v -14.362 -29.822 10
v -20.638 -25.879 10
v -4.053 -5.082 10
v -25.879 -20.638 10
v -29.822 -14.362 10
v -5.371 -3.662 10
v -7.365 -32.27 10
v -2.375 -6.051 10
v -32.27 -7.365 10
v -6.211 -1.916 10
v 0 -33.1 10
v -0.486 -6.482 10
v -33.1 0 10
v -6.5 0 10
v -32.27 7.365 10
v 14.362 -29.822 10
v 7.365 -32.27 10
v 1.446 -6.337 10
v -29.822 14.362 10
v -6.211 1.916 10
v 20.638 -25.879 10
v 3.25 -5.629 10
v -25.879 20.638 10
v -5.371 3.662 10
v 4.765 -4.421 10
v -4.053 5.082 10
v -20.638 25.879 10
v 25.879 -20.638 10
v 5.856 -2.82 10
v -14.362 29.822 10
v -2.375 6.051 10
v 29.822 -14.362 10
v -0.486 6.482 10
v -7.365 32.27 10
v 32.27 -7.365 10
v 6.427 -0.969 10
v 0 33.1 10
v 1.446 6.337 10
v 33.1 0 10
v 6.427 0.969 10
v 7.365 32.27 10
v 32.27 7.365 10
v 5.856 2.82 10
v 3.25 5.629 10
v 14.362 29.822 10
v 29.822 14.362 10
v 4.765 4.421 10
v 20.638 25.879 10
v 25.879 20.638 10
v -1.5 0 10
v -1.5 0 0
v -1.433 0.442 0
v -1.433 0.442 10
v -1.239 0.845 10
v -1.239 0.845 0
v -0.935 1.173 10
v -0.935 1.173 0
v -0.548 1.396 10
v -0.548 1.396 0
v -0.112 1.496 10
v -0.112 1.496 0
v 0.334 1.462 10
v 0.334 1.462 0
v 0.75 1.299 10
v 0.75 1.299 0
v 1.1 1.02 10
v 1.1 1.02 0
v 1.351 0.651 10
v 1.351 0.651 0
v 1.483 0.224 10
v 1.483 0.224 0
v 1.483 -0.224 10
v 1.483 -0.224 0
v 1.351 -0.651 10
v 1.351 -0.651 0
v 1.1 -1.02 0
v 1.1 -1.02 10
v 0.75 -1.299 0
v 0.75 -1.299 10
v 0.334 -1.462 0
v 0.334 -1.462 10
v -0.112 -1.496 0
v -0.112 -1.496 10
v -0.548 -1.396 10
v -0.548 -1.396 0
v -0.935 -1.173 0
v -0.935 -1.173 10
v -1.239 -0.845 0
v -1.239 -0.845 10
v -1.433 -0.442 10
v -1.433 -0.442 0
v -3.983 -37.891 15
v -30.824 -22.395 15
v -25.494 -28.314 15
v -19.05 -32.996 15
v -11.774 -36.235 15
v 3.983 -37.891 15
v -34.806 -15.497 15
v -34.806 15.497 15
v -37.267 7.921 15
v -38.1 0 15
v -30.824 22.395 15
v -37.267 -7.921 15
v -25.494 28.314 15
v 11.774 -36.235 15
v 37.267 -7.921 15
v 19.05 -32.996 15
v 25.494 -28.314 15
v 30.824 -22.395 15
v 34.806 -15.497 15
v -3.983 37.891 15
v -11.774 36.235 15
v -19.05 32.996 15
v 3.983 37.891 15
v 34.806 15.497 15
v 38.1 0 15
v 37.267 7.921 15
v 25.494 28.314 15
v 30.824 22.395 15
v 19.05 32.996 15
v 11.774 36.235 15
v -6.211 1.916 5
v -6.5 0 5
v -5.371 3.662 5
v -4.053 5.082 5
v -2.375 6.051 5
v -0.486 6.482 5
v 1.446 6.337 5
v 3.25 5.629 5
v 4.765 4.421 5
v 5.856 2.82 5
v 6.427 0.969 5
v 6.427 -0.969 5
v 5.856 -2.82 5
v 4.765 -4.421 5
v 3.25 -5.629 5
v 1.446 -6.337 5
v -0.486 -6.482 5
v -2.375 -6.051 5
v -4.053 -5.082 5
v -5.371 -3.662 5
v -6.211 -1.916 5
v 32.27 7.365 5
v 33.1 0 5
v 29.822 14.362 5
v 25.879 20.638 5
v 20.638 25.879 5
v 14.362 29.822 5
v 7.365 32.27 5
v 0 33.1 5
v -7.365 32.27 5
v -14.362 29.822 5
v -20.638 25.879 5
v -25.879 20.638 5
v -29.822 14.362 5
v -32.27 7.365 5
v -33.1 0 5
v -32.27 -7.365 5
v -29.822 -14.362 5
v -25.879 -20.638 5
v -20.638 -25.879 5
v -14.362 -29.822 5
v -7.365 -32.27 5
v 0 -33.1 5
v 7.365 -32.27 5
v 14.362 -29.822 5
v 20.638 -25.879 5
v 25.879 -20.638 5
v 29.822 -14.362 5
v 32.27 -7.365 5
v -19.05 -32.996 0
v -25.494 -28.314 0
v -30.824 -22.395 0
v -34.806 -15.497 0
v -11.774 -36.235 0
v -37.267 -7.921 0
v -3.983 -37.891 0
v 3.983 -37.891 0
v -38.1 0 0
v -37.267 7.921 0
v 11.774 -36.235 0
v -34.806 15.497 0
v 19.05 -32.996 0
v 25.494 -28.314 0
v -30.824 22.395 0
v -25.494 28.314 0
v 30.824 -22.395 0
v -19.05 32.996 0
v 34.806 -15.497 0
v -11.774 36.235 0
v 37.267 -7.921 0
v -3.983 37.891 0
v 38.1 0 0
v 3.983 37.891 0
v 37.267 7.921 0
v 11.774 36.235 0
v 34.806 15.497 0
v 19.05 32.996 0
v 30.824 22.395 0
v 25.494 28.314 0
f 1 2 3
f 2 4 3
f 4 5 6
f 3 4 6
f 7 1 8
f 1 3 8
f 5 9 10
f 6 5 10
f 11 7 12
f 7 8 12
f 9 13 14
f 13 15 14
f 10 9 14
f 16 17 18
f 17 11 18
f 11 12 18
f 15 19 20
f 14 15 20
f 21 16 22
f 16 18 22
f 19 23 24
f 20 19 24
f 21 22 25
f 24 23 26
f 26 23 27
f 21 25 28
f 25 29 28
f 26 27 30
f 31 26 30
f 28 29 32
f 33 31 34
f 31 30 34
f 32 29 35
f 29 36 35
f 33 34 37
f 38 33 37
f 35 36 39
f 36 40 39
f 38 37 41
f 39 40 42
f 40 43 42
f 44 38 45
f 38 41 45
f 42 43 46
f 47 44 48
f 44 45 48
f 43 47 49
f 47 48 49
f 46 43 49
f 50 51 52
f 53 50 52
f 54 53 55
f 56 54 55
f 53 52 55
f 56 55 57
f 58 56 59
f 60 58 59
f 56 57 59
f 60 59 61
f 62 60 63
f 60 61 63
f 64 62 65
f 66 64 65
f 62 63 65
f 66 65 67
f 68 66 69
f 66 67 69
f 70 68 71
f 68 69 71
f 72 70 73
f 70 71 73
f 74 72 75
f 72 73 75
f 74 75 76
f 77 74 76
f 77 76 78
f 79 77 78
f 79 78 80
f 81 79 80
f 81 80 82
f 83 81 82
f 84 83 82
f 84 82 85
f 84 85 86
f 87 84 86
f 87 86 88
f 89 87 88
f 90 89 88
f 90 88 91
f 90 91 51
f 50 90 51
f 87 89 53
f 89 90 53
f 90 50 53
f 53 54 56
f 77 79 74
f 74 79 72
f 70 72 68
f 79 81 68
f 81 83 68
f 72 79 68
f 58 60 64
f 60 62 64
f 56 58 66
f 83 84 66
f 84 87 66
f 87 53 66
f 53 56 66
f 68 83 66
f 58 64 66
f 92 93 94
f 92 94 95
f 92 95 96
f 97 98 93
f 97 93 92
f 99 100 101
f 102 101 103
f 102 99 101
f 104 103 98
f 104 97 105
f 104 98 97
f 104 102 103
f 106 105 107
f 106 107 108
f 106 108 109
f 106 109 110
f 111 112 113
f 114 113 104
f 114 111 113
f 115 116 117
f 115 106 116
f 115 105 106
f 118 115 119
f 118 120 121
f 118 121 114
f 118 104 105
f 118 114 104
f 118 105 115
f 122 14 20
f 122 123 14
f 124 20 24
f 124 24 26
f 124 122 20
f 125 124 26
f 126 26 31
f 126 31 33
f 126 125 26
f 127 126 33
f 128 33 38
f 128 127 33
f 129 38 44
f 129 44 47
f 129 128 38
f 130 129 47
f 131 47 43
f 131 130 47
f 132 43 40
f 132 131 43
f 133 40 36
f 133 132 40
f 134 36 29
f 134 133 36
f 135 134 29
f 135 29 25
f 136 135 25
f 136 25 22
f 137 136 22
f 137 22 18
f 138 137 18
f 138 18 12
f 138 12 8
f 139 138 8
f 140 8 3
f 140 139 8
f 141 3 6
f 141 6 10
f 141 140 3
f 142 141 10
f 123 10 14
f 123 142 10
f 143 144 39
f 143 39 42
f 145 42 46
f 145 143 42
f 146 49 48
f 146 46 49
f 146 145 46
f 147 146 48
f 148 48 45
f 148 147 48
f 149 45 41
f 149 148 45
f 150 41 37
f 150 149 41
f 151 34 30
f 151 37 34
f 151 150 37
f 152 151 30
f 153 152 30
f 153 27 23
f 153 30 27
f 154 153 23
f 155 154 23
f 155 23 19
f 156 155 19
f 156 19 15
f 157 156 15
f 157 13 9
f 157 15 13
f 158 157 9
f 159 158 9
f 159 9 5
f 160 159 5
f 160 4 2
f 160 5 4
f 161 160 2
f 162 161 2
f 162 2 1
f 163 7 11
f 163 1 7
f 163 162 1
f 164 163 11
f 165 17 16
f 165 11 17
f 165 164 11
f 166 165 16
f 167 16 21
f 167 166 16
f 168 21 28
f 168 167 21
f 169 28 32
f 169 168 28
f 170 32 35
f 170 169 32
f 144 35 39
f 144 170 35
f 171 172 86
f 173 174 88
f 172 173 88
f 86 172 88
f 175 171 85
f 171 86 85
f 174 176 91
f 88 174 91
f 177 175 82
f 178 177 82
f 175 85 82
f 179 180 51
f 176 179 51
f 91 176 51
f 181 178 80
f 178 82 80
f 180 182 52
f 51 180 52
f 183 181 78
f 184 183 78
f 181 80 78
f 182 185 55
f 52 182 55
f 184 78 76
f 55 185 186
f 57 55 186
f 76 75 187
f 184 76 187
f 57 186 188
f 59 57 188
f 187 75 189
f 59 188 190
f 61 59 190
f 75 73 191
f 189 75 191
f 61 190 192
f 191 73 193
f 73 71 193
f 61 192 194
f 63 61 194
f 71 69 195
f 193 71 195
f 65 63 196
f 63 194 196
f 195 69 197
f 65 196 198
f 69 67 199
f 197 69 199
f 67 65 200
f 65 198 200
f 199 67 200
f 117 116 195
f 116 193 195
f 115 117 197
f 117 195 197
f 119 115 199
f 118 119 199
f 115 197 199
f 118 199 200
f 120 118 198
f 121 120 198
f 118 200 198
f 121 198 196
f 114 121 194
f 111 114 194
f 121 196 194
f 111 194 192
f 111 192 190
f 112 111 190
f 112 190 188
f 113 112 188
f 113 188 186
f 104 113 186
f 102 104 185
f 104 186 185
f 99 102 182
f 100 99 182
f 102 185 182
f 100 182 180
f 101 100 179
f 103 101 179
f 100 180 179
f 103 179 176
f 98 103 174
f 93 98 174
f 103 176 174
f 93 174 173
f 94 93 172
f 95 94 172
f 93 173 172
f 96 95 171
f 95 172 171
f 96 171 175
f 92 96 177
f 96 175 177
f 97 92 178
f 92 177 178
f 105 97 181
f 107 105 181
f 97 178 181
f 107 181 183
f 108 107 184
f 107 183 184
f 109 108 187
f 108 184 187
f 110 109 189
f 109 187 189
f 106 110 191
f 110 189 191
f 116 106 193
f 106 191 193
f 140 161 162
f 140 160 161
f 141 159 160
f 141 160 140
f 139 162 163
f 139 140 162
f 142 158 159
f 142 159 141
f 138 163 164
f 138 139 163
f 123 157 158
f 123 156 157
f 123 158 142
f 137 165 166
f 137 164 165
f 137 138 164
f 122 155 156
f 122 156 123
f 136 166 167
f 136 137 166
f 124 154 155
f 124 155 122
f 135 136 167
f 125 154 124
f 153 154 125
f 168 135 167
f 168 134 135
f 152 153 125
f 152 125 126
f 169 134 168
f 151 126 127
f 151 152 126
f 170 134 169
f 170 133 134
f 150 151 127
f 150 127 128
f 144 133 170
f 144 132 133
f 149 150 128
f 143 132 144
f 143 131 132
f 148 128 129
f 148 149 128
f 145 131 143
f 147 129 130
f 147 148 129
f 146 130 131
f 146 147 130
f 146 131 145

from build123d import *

# Parameters (mm, degrees)
SKETCH1_R                       = 38.1
BOSS_EXTRUDE1_DEPTH             = 15
F_3_0MM_CLEARANCE_DOWEL_HOLE1_D = 3
SHELL3_T                        = -5
BOSS_EXTRUDE2_START             = 10
SKETCH1_2_R                     = 38.1
BOSS_EXTRUDE2_DEPTH             = 5


with BuildPart() as part:
    # Sketch1 → Boss-Extrude1 (new body)
    with BuildSketch(Plane.XY):
        Circle(SKETCH1_R)
    extrude(amount=BOSS_EXTRUDE1_DEPTH)

    # Ø3.0mm Clearance Dowel Hole1 (through all)
    with Locations(Plane.XY.offset(15)):
        with Locations((0, 0)):
            Hole(F_3_0MM_CLEARANCE_DOWEL_HOLE1_D / 2)

    # Shell3
    shell3_openings = [part.faces().sort_by_distance(p)[0] for p in [
        (-37.022369265, 0, 15),
    ]]
    offset(amount=SHELL3_T, openings=shell3_openings, kind=Kind.INTERSECTION)

    # Sketch1<2> → Boss-Extrude2 (add)
    with BuildSketch(Plane.XY.offset(BOSS_EXTRUDE2_START)):
        Circle(SKETCH1_2_R)
    extrude(amount=BOSS_EXTRUDE2_DEPTH)


solid = part.part
